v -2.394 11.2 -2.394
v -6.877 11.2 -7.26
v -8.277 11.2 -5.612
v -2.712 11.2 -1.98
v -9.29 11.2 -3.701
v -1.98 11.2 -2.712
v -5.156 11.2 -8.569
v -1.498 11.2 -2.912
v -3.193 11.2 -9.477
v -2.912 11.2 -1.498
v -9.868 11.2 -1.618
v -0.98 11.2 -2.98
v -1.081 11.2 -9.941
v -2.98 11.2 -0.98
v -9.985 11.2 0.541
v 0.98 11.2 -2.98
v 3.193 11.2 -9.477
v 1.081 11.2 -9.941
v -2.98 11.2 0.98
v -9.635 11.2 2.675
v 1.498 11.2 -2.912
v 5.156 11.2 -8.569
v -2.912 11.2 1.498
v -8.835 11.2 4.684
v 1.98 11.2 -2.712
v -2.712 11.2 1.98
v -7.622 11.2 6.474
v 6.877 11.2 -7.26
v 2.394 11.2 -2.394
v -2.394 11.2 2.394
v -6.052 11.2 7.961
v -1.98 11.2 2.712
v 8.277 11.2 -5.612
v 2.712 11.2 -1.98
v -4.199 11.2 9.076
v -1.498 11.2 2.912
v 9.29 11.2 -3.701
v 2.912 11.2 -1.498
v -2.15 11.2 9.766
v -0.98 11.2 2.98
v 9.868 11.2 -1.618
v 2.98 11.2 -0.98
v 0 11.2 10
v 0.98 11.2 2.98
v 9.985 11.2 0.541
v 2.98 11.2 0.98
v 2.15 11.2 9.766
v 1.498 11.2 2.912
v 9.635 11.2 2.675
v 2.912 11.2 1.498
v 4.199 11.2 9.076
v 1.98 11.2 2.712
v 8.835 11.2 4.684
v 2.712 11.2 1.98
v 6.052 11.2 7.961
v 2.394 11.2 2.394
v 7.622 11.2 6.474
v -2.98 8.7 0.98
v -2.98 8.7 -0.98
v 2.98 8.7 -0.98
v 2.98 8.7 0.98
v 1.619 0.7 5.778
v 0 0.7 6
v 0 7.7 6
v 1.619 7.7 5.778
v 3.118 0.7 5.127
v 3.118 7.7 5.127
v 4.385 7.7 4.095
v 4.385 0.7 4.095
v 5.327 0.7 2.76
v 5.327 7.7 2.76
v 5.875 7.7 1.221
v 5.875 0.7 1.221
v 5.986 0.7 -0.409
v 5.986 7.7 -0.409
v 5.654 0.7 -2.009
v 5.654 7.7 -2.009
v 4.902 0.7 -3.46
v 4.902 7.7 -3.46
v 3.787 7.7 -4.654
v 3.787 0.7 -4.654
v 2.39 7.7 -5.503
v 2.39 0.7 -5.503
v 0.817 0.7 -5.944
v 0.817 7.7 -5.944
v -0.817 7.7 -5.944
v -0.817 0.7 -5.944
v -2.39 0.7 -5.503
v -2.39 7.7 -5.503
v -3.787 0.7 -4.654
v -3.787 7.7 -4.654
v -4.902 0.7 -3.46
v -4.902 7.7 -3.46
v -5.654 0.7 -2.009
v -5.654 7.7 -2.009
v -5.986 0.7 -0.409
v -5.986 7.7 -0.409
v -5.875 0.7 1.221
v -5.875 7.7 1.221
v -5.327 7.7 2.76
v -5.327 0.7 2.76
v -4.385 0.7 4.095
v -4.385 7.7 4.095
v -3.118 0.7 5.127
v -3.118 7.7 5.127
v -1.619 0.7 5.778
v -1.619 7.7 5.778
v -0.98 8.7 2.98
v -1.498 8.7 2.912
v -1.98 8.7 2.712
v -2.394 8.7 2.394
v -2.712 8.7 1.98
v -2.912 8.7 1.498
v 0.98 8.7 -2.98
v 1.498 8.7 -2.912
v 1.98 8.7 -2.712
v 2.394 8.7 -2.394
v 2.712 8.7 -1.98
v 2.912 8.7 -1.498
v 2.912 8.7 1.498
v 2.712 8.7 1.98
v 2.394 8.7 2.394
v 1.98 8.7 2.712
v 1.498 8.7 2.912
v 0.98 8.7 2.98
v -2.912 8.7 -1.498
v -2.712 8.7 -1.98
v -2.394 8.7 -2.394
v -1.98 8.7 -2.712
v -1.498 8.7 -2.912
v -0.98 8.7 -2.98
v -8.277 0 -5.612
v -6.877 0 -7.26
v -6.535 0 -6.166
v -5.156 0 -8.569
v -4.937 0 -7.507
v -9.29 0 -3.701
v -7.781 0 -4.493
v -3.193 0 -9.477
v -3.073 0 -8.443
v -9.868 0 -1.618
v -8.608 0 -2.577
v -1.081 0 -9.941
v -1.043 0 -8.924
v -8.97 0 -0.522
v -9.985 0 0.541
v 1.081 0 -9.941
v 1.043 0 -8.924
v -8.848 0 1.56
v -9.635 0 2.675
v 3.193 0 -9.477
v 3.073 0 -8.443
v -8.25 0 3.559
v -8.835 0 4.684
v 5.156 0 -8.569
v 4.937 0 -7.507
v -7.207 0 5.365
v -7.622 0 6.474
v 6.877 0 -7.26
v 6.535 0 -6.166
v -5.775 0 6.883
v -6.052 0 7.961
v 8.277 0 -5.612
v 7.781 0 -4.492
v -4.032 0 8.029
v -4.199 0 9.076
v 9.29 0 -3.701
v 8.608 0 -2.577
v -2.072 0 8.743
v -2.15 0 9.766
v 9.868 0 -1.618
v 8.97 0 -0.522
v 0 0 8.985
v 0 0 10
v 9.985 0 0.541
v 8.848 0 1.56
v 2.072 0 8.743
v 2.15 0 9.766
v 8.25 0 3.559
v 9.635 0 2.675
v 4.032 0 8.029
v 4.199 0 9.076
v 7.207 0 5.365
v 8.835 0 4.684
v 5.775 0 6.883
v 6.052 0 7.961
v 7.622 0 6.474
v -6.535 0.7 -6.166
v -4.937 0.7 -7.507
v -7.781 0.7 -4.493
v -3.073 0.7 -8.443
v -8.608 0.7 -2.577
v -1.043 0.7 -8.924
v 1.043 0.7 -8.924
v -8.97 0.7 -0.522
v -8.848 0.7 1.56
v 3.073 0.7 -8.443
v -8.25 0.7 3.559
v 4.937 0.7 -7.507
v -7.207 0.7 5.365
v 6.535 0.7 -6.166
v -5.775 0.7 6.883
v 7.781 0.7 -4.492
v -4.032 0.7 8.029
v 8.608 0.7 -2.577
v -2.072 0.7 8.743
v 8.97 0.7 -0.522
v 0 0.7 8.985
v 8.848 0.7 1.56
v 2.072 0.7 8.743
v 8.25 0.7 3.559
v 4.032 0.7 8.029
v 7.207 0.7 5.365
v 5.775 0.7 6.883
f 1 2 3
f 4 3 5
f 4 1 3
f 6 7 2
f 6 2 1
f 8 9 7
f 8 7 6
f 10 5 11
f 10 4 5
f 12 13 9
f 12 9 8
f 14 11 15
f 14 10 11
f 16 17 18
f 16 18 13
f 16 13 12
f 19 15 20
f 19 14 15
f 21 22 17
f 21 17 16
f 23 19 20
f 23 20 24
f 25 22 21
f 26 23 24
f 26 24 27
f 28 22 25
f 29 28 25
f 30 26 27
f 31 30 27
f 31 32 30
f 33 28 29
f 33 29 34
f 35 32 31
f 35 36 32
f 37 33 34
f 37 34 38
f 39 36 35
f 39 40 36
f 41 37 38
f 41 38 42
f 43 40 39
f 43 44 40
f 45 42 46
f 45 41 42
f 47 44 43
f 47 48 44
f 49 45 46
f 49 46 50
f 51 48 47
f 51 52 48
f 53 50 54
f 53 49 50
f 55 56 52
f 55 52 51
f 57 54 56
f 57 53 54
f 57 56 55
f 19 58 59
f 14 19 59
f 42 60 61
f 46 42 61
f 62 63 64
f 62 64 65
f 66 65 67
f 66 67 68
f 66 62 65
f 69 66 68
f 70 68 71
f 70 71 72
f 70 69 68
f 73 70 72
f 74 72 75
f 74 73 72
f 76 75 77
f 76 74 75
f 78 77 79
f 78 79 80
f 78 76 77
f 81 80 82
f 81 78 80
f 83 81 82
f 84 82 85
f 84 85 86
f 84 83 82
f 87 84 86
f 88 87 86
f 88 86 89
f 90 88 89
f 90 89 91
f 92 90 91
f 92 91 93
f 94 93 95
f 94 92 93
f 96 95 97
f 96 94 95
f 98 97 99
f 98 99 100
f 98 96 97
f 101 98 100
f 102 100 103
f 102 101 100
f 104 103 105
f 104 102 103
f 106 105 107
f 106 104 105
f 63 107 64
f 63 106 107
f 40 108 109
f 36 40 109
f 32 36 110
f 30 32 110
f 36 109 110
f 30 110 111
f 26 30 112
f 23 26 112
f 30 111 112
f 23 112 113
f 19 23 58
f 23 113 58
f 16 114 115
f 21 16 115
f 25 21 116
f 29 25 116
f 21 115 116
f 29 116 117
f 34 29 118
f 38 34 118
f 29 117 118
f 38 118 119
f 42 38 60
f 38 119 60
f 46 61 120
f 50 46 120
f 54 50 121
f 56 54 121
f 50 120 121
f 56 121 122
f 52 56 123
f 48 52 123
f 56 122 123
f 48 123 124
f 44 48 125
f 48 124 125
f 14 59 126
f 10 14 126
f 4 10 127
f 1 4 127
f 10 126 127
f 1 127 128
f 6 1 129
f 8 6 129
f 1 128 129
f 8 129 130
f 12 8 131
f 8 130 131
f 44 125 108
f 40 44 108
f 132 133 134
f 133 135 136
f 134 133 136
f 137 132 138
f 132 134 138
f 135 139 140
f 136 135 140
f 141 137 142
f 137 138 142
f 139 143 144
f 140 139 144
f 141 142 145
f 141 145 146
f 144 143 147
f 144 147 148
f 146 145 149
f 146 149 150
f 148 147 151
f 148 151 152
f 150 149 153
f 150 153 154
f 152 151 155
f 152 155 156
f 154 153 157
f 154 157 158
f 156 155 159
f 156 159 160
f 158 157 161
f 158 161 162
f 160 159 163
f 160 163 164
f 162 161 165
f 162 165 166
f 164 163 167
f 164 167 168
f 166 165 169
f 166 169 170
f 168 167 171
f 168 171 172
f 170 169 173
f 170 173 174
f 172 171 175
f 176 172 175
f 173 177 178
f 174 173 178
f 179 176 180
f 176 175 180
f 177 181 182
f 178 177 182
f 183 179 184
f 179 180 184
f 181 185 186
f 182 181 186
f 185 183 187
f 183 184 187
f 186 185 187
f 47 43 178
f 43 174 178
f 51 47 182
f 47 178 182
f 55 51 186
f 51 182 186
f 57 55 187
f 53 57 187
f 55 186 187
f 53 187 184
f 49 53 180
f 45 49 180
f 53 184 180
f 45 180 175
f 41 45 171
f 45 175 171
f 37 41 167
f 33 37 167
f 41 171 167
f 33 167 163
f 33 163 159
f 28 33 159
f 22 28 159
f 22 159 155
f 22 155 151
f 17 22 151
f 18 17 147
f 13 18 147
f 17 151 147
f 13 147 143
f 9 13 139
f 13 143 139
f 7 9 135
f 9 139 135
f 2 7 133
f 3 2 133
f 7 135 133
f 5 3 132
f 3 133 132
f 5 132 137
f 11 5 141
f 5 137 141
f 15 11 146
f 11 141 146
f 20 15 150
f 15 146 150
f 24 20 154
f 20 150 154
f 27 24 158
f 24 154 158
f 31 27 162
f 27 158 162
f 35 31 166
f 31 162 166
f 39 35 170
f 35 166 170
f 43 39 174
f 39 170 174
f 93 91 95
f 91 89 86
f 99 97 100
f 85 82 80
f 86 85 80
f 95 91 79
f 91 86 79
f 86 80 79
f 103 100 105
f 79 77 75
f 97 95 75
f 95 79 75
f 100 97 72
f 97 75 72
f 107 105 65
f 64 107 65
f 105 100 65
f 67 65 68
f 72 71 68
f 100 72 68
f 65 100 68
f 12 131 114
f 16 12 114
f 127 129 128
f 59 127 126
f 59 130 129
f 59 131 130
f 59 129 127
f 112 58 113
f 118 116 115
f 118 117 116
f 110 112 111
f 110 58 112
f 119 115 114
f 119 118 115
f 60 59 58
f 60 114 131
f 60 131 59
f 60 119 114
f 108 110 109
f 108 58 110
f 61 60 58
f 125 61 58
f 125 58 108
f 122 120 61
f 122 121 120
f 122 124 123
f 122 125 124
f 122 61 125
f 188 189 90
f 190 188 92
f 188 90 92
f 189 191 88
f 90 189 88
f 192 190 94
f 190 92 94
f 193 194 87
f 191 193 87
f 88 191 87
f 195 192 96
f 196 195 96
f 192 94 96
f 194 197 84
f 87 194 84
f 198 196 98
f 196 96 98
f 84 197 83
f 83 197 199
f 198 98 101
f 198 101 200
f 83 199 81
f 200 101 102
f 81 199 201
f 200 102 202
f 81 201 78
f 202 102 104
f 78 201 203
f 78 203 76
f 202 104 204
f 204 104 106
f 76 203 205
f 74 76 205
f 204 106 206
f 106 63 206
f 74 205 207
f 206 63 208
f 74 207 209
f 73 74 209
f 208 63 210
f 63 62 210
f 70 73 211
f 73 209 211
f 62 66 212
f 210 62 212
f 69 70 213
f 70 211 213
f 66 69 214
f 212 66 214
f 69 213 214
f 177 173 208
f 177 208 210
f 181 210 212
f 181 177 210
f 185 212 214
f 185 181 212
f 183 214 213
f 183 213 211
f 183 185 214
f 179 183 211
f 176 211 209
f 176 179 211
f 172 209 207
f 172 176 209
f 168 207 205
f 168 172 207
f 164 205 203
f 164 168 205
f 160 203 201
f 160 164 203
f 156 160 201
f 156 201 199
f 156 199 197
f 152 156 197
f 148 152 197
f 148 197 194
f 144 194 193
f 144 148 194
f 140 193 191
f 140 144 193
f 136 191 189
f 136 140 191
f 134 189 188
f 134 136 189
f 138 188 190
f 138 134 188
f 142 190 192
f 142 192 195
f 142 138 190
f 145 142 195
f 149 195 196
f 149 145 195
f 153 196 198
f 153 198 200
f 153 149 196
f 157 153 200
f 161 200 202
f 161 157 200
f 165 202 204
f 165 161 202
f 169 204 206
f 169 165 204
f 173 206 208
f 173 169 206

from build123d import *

# Parameters (mm, degrees)
SKETCH1_R           = 10
SKETCH1_R_2         = 8.985
BOSS_EXTRUDE1_DEPTH = 0.7
SKETCH2_R           = 10
SKETCH2_R_2         = 6
BOSS_EXTRUDE2_DEPTH = 7
SKETCH3_R           = 10
BOSS_EXTRUDE3_DEPTH = 1
SKETCH4_R           = 10
BOSS_EXTRUDE4_DEPTH = 2.5


with BuildPart() as part:
    # Sketch1 → Boss-Extrude1 (new body)
    with BuildSketch(Plane(origin=(0, 0, 0), x_dir=(1, 0, 0), z_dir=(0, 1, 0))):
        with Locations(Location((0, 0, 0), (0, 0, 270))):
            Circle(SKETCH1_R)
        with Locations(Location((0, 0, 0), (0, 0, 270))):
            Circle(SKETCH1_R_2, mode=Mode.SUBTRACT)
    extrude(amount=BOSS_EXTRUDE1_DEPTH)

    # Sketch2 → Boss-Extrude2 (add)
    with BuildSketch(Plane(origin=(0, 0.7, 0), x_dir=(1, 0, 0), z_dir=(0, 1, 0))):
        with Locations(Location((0, 0, 0), (0, 0, 270))):
            Circle(SKETCH2_R)
        with Locations(Location((0, 0, 0), (0, 0, 270))):
            Circle(SKETCH2_R_2, mode=Mode.SUBTRACT)
    extrude(amount=BOSS_EXTRUDE2_DEPTH)

    # Sketch3 → Boss-Extrude3 (add)
    with BuildSketch(Plane(origin=(0, 7.7, 0), x_dir=(1, 0, 0), z_dir=(0, 1, 0))):
        with Locations(Location((0, 0, 0), (0, 0, 270))):
            Circle(SKETCH3_R)
    extrude(amount=BOSS_EXTRUDE3_DEPTH)

    # Sketch4 → Boss-Extrude4 (add)
    with BuildSketch(Plane(origin=(0, 8.7, 0), x_dir=(1, 0, 0), z_dir=(0, 1, 0))):
        with Locations(Location((0, 0, 0), (0, 0, 270))):
            Circle(SKETCH4_R)
        with BuildLine():
            Line((-0.98, 2.98), (0.98, 2.98))
            ThreePointArc((0.98, 2.98), (2.394213562, 2.394213562), (2.98, 0.98))
            Line((2.98, 0.98), (2.98, -0.98))
            ThreePointArc((2.98, -0.98), (2.394213562, -2.394213562), (0.98, -2.98))
            Line((0.98, -2.98), (-0.98, -2.98))
            ThreePointArc((-0.98, -2.98), (-2.394213562, -2.394213562), (-2.98, -0.98))
            Line((-2.98, -0.98), (-2.98, 0.98))
            ThreePointArc((-2.98, 0.98), (-2.394213562, 2.394213562), (-0.98, 2.98))
        make_face(mode=Mode.SUBTRACT)
    extrude(amount=BOSS_EXTRUDE4_DEPTH)


solid = part.part
